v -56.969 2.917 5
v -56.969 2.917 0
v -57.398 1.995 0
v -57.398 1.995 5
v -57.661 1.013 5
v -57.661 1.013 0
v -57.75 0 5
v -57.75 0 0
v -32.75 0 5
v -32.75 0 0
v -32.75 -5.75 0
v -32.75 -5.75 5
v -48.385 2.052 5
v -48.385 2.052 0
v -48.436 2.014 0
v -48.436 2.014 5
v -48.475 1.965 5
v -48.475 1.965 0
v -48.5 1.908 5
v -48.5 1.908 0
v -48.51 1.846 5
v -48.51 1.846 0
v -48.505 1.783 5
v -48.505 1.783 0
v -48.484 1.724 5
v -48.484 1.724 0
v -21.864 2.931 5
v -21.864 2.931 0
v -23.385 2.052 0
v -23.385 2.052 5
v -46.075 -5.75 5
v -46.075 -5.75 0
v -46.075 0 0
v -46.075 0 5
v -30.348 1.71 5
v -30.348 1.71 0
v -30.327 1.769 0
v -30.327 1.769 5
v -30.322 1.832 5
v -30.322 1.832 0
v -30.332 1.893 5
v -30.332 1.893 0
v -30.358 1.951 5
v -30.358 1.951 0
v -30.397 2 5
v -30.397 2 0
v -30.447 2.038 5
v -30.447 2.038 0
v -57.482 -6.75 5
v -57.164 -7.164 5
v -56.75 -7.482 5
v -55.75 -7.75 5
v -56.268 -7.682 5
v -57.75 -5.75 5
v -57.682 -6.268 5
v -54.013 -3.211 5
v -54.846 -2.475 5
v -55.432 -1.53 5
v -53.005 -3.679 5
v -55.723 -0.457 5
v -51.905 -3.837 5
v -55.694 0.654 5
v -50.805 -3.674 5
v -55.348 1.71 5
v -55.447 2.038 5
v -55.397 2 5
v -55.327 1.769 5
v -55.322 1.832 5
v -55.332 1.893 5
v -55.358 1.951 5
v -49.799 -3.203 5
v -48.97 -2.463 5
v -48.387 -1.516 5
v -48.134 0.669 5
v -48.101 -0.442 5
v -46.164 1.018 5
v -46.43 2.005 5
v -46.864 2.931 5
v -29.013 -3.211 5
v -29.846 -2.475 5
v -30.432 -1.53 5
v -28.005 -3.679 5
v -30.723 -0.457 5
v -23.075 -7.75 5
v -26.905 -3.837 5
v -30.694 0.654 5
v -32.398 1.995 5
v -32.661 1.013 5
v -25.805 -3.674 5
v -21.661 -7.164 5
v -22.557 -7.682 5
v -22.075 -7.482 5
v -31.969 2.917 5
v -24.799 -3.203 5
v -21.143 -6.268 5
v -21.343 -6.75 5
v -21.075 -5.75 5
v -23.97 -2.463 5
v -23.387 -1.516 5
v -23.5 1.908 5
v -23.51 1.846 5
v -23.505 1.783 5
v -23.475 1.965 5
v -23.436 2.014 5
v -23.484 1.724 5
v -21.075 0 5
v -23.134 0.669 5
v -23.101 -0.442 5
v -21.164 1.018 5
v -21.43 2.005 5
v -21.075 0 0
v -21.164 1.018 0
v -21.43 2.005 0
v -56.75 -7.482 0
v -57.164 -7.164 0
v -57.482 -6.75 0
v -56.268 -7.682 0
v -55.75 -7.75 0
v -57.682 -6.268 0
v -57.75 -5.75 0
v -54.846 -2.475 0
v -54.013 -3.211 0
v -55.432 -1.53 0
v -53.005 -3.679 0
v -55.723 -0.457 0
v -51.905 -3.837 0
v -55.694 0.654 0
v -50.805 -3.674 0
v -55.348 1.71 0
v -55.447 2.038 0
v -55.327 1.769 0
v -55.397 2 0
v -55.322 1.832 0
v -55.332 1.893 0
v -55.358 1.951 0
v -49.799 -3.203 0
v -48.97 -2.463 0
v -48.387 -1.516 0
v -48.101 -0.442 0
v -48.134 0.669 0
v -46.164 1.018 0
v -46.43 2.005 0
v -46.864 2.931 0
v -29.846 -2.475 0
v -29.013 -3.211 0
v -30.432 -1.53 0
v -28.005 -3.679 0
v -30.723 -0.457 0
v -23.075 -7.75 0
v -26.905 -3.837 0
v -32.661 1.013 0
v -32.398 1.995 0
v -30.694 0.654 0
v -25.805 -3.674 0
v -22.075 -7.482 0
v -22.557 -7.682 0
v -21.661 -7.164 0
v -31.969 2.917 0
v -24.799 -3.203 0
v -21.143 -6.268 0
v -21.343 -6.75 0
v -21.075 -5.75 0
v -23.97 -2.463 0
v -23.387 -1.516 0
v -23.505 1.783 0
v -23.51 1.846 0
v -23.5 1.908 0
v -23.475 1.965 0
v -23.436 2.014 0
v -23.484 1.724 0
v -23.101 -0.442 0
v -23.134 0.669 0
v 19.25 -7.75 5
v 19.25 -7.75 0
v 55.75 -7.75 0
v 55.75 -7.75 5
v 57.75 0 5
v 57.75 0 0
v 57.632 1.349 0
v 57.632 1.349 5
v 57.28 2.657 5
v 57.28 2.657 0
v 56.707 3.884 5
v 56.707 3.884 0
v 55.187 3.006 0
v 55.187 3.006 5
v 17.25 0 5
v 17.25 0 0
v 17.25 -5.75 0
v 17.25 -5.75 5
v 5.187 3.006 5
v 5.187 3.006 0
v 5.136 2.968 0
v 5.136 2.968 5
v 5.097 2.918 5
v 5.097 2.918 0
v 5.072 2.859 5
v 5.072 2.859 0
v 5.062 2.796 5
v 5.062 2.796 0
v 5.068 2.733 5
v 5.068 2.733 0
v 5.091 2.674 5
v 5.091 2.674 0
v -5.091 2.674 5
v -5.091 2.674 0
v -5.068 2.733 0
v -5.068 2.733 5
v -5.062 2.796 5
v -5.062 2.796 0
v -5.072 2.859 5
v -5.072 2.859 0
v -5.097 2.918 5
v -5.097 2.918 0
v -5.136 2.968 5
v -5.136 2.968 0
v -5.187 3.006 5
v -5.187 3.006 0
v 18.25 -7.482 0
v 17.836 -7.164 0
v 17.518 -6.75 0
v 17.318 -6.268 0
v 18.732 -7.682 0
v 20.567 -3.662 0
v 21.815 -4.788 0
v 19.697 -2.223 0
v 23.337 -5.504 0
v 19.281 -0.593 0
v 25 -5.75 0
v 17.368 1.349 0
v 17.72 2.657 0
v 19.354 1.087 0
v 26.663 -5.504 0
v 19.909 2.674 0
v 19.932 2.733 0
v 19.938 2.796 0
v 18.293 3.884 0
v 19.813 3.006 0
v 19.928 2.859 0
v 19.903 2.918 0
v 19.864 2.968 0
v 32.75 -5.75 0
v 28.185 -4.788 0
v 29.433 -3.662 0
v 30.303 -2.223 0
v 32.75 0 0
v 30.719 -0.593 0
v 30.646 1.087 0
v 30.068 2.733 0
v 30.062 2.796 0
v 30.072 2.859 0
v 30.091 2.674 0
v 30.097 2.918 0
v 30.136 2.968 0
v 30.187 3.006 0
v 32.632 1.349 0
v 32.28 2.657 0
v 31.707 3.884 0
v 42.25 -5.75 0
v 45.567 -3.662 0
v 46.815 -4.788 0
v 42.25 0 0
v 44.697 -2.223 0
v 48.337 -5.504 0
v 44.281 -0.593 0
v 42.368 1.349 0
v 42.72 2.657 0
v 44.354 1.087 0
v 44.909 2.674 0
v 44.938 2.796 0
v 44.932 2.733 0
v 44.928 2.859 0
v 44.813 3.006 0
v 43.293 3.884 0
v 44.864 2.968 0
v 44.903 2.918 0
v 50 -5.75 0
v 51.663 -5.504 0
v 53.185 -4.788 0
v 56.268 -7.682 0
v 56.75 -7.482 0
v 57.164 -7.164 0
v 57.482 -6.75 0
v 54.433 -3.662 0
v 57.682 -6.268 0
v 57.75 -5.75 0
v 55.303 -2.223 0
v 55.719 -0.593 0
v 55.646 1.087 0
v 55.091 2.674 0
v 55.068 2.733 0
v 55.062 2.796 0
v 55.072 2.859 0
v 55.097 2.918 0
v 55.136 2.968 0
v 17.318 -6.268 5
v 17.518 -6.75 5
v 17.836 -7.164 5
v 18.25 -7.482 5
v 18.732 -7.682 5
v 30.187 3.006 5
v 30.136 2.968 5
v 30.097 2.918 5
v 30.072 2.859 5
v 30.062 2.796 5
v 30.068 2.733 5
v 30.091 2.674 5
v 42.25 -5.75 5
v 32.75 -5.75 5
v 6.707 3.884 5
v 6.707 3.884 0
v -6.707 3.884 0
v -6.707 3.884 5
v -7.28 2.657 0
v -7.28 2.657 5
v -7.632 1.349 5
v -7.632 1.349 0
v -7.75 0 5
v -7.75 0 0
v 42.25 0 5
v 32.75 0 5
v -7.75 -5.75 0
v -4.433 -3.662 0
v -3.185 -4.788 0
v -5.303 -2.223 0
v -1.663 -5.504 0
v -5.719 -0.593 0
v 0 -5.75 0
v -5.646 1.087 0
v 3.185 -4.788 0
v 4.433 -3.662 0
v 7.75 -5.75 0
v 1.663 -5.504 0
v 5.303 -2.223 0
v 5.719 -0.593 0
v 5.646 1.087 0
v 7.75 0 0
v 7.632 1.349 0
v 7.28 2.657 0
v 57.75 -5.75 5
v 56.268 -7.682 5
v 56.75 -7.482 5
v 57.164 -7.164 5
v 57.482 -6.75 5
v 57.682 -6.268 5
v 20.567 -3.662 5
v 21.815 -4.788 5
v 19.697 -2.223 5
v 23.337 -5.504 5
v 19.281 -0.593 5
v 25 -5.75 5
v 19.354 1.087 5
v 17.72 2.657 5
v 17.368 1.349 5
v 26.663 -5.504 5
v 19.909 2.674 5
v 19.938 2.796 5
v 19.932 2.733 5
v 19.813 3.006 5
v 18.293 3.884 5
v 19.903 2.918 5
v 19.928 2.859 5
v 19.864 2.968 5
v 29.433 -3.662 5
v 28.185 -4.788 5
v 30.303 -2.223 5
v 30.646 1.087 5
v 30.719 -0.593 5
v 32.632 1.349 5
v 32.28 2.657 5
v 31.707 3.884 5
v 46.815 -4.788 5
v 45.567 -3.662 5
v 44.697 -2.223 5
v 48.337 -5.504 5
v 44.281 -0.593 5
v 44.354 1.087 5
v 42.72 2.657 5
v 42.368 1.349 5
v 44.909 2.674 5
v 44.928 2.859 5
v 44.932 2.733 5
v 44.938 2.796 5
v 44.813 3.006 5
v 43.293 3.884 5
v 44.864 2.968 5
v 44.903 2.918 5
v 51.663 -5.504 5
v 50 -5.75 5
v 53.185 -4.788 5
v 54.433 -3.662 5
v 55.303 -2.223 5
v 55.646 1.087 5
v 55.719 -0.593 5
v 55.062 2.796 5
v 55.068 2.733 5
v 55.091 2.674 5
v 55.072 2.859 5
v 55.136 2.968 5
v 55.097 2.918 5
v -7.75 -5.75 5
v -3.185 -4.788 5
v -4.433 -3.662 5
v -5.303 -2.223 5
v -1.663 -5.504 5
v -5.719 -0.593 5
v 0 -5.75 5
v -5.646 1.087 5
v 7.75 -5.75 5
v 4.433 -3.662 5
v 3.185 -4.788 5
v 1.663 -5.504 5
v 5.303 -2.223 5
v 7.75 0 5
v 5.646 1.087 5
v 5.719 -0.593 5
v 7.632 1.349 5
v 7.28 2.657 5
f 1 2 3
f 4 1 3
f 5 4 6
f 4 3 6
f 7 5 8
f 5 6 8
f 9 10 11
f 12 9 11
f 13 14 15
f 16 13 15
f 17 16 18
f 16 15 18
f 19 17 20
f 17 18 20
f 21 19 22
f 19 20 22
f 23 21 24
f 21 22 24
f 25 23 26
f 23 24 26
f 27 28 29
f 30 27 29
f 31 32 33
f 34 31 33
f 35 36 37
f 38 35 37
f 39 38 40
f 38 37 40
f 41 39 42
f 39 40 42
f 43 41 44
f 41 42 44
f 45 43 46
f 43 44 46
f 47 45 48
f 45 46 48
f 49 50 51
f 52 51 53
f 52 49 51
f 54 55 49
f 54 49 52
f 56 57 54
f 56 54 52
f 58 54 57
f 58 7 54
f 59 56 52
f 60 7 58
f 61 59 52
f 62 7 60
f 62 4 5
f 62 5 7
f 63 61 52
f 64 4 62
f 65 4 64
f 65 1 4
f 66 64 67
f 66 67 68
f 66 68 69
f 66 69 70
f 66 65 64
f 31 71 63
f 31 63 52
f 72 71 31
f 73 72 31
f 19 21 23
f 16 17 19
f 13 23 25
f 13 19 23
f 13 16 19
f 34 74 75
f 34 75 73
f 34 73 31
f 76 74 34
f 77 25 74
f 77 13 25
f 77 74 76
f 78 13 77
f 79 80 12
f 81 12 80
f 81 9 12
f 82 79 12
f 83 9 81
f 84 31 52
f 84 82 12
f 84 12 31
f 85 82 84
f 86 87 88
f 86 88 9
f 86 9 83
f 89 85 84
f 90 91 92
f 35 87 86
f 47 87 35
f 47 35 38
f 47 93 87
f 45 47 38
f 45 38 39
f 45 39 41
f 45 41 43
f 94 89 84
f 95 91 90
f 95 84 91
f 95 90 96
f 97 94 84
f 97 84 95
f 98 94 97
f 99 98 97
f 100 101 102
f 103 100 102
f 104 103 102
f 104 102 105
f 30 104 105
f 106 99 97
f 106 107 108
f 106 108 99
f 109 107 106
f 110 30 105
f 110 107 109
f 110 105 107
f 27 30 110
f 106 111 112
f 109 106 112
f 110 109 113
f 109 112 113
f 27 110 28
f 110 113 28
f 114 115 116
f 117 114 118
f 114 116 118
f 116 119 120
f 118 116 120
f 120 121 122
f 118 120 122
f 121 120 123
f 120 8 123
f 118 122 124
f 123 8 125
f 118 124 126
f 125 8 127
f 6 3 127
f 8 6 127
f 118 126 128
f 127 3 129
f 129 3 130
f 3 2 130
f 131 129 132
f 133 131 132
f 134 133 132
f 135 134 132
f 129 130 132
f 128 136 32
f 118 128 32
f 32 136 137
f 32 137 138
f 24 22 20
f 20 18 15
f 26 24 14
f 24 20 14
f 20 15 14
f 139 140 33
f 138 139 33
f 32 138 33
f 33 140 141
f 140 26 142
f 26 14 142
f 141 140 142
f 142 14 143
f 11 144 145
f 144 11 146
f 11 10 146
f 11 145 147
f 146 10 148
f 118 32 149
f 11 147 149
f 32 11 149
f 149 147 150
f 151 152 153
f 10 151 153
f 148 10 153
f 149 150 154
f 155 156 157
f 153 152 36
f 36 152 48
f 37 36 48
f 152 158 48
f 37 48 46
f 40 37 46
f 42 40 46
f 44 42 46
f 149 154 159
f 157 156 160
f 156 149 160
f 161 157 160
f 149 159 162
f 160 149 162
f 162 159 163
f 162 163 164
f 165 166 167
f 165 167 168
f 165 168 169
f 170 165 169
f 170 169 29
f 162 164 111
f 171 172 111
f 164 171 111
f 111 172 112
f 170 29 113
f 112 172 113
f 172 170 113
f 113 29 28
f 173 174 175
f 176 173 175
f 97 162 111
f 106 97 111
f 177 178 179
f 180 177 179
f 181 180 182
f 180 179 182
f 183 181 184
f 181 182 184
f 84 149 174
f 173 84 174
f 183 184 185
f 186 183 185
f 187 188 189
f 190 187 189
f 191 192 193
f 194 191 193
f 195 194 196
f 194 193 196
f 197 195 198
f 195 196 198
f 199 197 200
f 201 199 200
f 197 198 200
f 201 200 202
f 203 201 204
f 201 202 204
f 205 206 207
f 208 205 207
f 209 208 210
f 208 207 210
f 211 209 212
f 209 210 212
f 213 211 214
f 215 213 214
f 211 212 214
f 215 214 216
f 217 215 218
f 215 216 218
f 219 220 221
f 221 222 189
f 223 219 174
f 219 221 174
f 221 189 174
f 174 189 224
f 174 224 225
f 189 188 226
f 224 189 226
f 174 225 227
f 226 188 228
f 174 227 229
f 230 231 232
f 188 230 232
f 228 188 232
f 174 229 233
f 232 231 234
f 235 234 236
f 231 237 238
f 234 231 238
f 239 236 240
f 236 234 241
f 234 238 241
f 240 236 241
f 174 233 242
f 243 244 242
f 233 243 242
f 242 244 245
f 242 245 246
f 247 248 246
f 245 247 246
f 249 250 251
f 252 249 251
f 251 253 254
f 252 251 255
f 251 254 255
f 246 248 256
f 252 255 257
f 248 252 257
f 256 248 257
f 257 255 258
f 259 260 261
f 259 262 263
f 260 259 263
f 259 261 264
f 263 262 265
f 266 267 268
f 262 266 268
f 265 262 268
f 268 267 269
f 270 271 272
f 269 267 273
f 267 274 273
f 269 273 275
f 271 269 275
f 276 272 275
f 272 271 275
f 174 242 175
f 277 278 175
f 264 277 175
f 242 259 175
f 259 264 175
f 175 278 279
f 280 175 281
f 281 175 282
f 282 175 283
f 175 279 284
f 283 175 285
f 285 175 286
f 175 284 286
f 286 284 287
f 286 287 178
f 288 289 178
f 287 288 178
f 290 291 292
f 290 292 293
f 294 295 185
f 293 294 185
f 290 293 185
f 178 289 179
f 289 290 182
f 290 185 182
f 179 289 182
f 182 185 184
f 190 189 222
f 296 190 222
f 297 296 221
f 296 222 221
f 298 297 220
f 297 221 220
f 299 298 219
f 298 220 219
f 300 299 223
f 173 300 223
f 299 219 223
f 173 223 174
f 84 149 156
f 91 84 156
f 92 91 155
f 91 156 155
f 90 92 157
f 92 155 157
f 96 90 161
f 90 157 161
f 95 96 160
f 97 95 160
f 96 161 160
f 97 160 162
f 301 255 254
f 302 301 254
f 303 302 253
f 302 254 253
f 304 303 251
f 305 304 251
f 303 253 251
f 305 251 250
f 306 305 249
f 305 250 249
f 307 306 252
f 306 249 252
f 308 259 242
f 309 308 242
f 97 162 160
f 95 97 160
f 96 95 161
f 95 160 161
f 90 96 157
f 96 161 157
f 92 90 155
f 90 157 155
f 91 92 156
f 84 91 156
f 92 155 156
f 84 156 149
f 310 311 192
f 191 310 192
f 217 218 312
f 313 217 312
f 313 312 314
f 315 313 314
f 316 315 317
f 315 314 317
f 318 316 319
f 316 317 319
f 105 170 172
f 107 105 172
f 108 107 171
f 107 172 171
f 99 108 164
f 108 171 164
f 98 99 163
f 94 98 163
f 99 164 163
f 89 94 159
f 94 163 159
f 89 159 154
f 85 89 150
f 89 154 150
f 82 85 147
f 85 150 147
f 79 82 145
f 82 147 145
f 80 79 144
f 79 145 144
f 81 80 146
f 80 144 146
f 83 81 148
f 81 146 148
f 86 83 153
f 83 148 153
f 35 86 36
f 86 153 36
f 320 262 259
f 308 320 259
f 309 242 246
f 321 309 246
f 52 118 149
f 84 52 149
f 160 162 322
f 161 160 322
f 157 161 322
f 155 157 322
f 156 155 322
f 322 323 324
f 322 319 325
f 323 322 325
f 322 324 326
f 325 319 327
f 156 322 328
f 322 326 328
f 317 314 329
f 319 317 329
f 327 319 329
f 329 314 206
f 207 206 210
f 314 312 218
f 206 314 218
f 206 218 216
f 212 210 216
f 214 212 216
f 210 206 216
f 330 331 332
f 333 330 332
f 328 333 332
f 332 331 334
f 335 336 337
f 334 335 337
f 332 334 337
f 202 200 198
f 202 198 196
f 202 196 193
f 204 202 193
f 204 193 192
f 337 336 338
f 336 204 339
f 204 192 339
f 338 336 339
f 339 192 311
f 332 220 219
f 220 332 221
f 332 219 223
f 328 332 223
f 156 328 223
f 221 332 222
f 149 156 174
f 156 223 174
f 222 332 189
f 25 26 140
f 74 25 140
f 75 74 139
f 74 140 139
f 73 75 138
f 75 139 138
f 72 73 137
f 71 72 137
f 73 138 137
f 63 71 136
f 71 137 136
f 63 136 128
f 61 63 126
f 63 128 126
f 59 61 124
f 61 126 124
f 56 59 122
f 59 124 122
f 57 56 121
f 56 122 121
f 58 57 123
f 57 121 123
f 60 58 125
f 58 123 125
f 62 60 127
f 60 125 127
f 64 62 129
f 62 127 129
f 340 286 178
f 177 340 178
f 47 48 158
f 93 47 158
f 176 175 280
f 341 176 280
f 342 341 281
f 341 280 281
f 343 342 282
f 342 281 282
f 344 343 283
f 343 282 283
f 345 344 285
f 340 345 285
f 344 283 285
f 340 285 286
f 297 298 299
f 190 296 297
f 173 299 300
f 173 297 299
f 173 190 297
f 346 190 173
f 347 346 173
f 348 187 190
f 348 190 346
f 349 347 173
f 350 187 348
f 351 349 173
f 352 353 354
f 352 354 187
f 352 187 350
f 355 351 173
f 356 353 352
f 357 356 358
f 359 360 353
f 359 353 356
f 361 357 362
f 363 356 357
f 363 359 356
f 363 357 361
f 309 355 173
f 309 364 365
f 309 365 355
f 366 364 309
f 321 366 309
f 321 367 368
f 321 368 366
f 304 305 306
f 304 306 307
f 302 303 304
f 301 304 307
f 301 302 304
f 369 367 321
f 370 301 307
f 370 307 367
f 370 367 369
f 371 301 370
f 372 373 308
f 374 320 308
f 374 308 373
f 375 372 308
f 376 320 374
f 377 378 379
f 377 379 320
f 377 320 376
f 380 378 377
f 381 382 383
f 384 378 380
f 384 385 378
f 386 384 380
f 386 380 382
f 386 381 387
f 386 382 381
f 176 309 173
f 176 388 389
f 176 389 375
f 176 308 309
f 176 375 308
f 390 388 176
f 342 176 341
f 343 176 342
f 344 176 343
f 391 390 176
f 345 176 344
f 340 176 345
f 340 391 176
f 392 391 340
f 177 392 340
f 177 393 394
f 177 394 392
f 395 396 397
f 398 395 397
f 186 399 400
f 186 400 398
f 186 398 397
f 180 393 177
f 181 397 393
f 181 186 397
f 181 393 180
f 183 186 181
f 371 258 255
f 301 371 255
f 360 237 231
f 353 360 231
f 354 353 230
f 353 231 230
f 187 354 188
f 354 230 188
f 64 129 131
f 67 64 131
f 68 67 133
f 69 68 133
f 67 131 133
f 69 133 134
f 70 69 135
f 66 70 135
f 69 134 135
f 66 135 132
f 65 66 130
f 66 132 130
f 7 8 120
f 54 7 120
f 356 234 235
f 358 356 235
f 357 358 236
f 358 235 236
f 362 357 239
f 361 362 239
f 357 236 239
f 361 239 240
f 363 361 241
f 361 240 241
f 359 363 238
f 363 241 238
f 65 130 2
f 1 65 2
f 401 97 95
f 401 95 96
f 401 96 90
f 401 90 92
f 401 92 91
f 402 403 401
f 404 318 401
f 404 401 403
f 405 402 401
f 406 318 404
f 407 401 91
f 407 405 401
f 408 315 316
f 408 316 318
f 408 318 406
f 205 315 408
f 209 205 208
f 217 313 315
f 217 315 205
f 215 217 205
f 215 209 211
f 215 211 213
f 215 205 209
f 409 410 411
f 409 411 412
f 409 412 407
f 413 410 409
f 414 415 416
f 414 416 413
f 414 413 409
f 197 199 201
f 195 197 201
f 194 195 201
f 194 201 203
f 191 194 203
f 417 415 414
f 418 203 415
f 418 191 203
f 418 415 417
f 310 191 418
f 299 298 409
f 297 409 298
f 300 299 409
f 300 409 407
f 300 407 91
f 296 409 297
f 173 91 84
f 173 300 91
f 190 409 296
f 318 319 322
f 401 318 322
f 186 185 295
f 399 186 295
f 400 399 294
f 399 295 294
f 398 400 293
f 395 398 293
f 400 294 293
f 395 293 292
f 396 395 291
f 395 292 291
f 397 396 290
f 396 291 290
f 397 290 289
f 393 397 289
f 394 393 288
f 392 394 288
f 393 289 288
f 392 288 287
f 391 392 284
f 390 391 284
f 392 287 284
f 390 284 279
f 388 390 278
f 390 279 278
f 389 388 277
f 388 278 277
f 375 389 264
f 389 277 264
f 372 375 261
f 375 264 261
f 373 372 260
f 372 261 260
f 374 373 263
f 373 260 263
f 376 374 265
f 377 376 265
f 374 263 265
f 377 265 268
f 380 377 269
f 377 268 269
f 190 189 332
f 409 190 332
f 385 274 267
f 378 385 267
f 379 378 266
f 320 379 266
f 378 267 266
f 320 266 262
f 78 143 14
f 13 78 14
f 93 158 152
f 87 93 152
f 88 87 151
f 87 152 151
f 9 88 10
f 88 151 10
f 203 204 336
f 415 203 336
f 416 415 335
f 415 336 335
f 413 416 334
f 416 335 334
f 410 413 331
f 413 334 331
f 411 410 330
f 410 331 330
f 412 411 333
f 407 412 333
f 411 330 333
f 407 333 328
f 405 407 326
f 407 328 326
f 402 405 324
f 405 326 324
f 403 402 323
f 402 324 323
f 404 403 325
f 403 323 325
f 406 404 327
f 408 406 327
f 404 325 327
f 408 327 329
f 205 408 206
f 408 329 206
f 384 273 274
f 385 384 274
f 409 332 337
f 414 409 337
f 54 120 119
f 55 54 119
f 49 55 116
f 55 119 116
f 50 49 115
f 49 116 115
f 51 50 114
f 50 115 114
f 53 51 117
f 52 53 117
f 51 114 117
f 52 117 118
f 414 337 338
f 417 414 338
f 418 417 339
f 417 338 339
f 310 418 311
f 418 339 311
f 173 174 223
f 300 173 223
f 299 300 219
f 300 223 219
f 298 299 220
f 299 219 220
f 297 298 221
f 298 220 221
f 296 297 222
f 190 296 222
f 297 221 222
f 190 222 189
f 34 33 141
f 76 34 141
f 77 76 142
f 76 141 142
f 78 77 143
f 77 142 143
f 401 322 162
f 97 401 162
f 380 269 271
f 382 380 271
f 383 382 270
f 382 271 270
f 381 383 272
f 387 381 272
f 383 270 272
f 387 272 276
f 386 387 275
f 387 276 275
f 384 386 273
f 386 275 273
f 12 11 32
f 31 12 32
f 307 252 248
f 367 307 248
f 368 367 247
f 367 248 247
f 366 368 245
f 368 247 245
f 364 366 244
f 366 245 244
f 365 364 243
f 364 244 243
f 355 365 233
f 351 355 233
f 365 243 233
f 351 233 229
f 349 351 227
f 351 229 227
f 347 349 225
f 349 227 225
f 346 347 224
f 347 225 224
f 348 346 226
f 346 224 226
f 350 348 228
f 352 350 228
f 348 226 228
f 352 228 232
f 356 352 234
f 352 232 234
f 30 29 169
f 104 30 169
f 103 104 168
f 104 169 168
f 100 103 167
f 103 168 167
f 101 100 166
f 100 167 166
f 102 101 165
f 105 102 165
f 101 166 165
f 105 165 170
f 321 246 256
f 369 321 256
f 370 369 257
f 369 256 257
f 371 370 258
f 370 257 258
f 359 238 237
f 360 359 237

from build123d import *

# Parameters (mm, degrees)
F1_DEPTH = 5
F2_DEPTH = 5


# Not quite as in the source:
# - a feature names something its author has since deleted; it is built from what else it names


with BuildPart() as f1:
    # F0 (on Top) → F1 (new body)
    with BuildSketch(Plane.XY):
        with BuildLine():
            ThreePointArc((5.0906607601, 2.6735132364), (0, -5.75), (-5.0906607601, 2.6735132364))
            ThreePointArc((-5.0906607601, 2.6735132364), (-5.0718550548, 2.8592753519), (-5.1869938367, 3.0062592933))
            Line((-5.1869938367, 3.0062592933), (-6.7066912921, 3.8836570282))
            ThreePointArc((-6.7066912921, 3.8836570282), (-7.4846295003, 2.0106768122), (-7.75, 0))
            ThreePointArc((-7.75, 0), (-5.4800775542, -5.4800775542), (0, -7.75))
            ThreePointArc((0, -7.75), (5.4800775542, -5.4800775542), (7.75, 0))
            ThreePointArc((7.75, 0), (7.4846295003, 2.0106768122), (6.7066912921, 3.8836570282))
            Line((6.7066912921, 3.8836570282), (5.1869938367, 3.0062592933))
            ThreePointArc((5.1869938367, 3.0062592933), (5.0718550548, 2.8592753519), (5.0906607601, 2.6735132364))
        make_face()
        with BuildLine():
            ThreePointArc((0, -7.75), (-5.4800775542, -5.4800775542), (-7.75, 0))
            Line((-7.75, 0), (-7.75, -5.75))
            Line((-7.75, -5.75), (-21.075, -5.75))
            ThreePointArc((-21.075, -5.75), (-21.6607864376, -7.1642135624), (-23.075, -7.75))
            Line((-23.075, -7.75), (-7.75, -7.75))
            Line((-7.75, -7.75), (-5.75, -7.75))
            Line((-5.75, -7.75), (0, -7.75))
        make_face()
        with BuildLine():
            Line((7.75, -5.75), (7.75, 0))
            ThreePointArc((7.75, 0), (5.4800775542, -5.4800775542), (0, -7.75))
            Line((0, -7.75), (5.75, -7.75))
            Line((5.75, -7.75), (19.25, -7.75))
            ThreePointArc((19.25, -7.75), (17.8357864376, -7.1642135624), (17.25, -5.75))
            Line((17.25, -5.75), (7.75, -5.75))
        make_face()
    extrude(amount=F1_DEPTH)


with BuildPart() as f2:
    # F0 (on Top) → F2 (new body)
    with BuildSketch(Plane.XY):
        with BuildLine():
            ThreePointArc((-57.75, 0), (-51.9125, -5.8375), (-46.075, 0))
            ThreePointArc((-46.075, 0), (-46.2757134574, 1.5175782427), (-46.8640513825, 2.9307972987))
            Line((-46.8640513825, 2.9307972987), (-48.3854905692, 2.0523939747))
            ThreePointArc((-48.3854905692, 2.0523939747), (-48.5000018905, 1.9075418417), (-48.4838550604, 1.723600919))
            ThreePointArc((-48.4838550604, 1.723600919), (-51.9048651488, -3.8374924051), (-55.3479761214, 1.7099444637))
            ThreePointArc((-55.3479761214, 1.7099444637), (-55.3324173522, 1.8934720901), (-55.4467856407, 2.0378478482))
            Line((-55.4467856407, 2.0378478482), (-56.9690803045, 2.9167450821))
            ThreePointArc((-56.9690803045, 2.9167450821), (-57.5513914592, 1.5097381764), (-57.75, 0))
        make_face()
        with BuildLine():
            Line((-55.75, -7.75), (-48.075, -7.75))
            ThreePointArc((-48.075, -7.75), (-46.6607864376, -7.1642135624), (-46.075, -5.75))
            Line((-46.075, -5.75), (-46.075, 0))
            ThreePointArc((-46.075, 0), (-51.9125, -5.8375), (-57.75, 0))
            Line((-57.75, 0), (-57.75, -5.75))
            ThreePointArc((-57.75, -5.75), (-57.1642135624, -7.1642135624), (-55.75, -7.75))
        make_face()
        with BuildLine():
            ThreePointArc((-32.75, 0), (-26.9125, -5.8375), (-21.075, 0))
            ThreePointArc((-21.075, 0), (-21.2757134574, 1.5175782427), (-21.8640513825, 2.9307972987))
            Line((-21.8640513825, 2.9307972987), (-23.3854905692, 2.0523939747))
            ThreePointArc((-23.3854905692, 2.0523939747), (-23.5000018905, 1.9075418417), (-23.4838550604, 1.723600919))
            ThreePointArc((-23.4838550604, 1.723600919), (-26.9048651488, -3.8374924051), (-30.3479761214, 1.7099444637))
            ThreePointArc((-30.3479761214, 1.7099444637), (-30.3324173522, 1.8934720901), (-30.4467856407, 2.0378478482))
            Line((-30.4467856407, 2.0378478482), (-31.9690803045, 2.9167450821))
            ThreePointArc((-31.9690803045, 2.9167450821), (-32.5513914592, 1.5097381764), (-32.75, 0))
        make_face()
        with BuildLine():
            ThreePointArc((-23.075, -7.75), (-21.6607864376, -7.1642135624), (-21.075, -5.75))
            Line((-21.075, -5.75), (-21.075, 0))
            ThreePointArc((-21.075, 0), (-26.9125, -5.8375), (-32.75, 0))
            Line((-32.75, 0), (-32.75, -5.75))
            ThreePointArc((-32.75, -5.75), (-32.1642135624, -7.1642135624), (-30.75, -7.75))
            Line((-30.75, -7.75), (-23.075, -7.75))
        make_face()
        with BuildLine():
            Line((-48.075, -7.75), (-30.75, -7.75))
            ThreePointArc((-30.75, -7.75), (-32.1642135624, -7.1642135624), (-32.75, -5.75))
            Line((-32.75, -5.75), (-46.075, -5.75))
            ThreePointArc((-46.075, -5.75), (-46.6607864376, -7.1642135624), (-48.075, -7.75))
        make_face()
    extrude(amount=F2_DEPTH)


with BuildPart() as f2b:
    # F0 (on Top) → F2, piece 2 (new body)
    with BuildSketch(Plane.XY):
        with BuildLine():
            ThreePointArc((18.2933087079, 3.8836570282), (17.5153704997, 2.0106768122), (17.25, 0))
            ThreePointArc((17.25, 0), (19.5199224458, -5.4800775542), (25, -7.75))
            ThreePointArc((25, -7.75), (30.4800775542, -5.4800775542), (32.75, 0))
            ThreePointArc((32.75, 0), (32.4846295003, 2.0106768122), (31.7066912921, 3.8836570282))
            Line((31.7066912921, 3.8836570282), (30.1869938367, 3.0062592933))
            ThreePointArc((30.1869938367, 3.0062592933), (30.0718550548, 2.8592753519), (30.0906607601, 2.6735132364))
            ThreePointArc((30.0906607601, 2.6735132364), (25, -5.75), (19.9093392399, 2.6735132364))
            ThreePointArc((19.9093392399, 2.6735132364), (19.9281449452, 2.8592753519), (19.8130061633, 3.0062592933))
            Line((19.8130061633, 3.0062592933), (18.2933087079, 3.8836570282))
        make_face()
        with BuildLine():
            Line((17.25, 0), (17.25, -5.75))
            ThreePointArc((17.25, -5.75), (17.8357864376, -7.1642135624), (19.25, -7.75))
            Line((19.25, -7.75), (25, -7.75))
            ThreePointArc((25, -7.75), (19.5199224458, -5.4800775542), (17.25, 0))
        make_face()
        with BuildLine():
            ThreePointArc((32.75, 0), (30.4800775542, -5.4800775542), (25, -7.75))
            Line((25, -7.75), (30.75, -7.75))
            ThreePointArc((30.75, -7.75), (32.1642135624, -7.1642135624), (32.75, -5.75))
            Line((32.75, -5.75), (32.75, 0))
        make_face()
        with BuildLine():
            ThreePointArc((42.25, 0), (44.5199224458, -5.4800775542), (50, -7.75))
            ThreePointArc((50, -7.75), (55.4800775542, -5.4800775542), (57.75, 0))
            ThreePointArc((57.75, 0), (57.4846295003, 2.0106768122), (56.7066912921, 3.8836570282))
            Line((56.7066912921, 3.8836570282), (55.1869938367, 3.0062592933))
            ThreePointArc((55.1869938367, 3.0062592933), (55.0718550548, 2.8592753519), (55.0906607601, 2.6735132364))
            ThreePointArc((55.0906607601, 2.6735132364), (50, -5.75), (44.9093392399, 2.6735132364))
            ThreePointArc((44.9093392399, 2.6735132364), (44.9281449452, 2.8592753519), (44.8130061633, 3.0062592933))
            Line((44.8130061633, 3.0062592933), (43.2933087079, 3.8836570282))
            ThreePointArc((43.2933087079, 3.8836570282), (42.5153704997, 2.0106768122), (42.25, 0))
        make_face()
        with BuildLine():
            ThreePointArc((42.25, -5.75), (42.8357864376, -7.1642135624), (44.25, -7.75))
            Line((44.25, -7.75), (50, -7.75))
            ThreePointArc((50, -7.75), (44.5199224458, -5.4800775542), (42.25, 0))
            Line((42.25, 0), (42.25, -5.75))
        make_face()
        with BuildLine():
            ThreePointArc((57.75, 0), (55.4800775542, -5.4800775542), (50, -7.75))
            Line((50, -7.75), (55.75, -7.75))
            ThreePointArc((55.75, -7.75), (57.1642135624, -7.1642135624), (57.75, -5.75))
            Line((57.75, -5.75), (57.75, 0))
        make_face()
        with BuildLine():
            ThreePointArc((32.75, -5.75), (32.1642135624, -7.1642135624), (30.75, -7.75))
            Line((30.75, -7.75), (44.25, -7.75))
            ThreePointArc((44.25, -7.75), (42.8357864376, -7.1642135624), (42.25, -5.75))
            Line((42.25, -5.75), (32.75, -5.75))
        make_face()
    extrude(amount=F2_DEPTH)


solid = Compound([f1.part, f2.part, f2b.part])
